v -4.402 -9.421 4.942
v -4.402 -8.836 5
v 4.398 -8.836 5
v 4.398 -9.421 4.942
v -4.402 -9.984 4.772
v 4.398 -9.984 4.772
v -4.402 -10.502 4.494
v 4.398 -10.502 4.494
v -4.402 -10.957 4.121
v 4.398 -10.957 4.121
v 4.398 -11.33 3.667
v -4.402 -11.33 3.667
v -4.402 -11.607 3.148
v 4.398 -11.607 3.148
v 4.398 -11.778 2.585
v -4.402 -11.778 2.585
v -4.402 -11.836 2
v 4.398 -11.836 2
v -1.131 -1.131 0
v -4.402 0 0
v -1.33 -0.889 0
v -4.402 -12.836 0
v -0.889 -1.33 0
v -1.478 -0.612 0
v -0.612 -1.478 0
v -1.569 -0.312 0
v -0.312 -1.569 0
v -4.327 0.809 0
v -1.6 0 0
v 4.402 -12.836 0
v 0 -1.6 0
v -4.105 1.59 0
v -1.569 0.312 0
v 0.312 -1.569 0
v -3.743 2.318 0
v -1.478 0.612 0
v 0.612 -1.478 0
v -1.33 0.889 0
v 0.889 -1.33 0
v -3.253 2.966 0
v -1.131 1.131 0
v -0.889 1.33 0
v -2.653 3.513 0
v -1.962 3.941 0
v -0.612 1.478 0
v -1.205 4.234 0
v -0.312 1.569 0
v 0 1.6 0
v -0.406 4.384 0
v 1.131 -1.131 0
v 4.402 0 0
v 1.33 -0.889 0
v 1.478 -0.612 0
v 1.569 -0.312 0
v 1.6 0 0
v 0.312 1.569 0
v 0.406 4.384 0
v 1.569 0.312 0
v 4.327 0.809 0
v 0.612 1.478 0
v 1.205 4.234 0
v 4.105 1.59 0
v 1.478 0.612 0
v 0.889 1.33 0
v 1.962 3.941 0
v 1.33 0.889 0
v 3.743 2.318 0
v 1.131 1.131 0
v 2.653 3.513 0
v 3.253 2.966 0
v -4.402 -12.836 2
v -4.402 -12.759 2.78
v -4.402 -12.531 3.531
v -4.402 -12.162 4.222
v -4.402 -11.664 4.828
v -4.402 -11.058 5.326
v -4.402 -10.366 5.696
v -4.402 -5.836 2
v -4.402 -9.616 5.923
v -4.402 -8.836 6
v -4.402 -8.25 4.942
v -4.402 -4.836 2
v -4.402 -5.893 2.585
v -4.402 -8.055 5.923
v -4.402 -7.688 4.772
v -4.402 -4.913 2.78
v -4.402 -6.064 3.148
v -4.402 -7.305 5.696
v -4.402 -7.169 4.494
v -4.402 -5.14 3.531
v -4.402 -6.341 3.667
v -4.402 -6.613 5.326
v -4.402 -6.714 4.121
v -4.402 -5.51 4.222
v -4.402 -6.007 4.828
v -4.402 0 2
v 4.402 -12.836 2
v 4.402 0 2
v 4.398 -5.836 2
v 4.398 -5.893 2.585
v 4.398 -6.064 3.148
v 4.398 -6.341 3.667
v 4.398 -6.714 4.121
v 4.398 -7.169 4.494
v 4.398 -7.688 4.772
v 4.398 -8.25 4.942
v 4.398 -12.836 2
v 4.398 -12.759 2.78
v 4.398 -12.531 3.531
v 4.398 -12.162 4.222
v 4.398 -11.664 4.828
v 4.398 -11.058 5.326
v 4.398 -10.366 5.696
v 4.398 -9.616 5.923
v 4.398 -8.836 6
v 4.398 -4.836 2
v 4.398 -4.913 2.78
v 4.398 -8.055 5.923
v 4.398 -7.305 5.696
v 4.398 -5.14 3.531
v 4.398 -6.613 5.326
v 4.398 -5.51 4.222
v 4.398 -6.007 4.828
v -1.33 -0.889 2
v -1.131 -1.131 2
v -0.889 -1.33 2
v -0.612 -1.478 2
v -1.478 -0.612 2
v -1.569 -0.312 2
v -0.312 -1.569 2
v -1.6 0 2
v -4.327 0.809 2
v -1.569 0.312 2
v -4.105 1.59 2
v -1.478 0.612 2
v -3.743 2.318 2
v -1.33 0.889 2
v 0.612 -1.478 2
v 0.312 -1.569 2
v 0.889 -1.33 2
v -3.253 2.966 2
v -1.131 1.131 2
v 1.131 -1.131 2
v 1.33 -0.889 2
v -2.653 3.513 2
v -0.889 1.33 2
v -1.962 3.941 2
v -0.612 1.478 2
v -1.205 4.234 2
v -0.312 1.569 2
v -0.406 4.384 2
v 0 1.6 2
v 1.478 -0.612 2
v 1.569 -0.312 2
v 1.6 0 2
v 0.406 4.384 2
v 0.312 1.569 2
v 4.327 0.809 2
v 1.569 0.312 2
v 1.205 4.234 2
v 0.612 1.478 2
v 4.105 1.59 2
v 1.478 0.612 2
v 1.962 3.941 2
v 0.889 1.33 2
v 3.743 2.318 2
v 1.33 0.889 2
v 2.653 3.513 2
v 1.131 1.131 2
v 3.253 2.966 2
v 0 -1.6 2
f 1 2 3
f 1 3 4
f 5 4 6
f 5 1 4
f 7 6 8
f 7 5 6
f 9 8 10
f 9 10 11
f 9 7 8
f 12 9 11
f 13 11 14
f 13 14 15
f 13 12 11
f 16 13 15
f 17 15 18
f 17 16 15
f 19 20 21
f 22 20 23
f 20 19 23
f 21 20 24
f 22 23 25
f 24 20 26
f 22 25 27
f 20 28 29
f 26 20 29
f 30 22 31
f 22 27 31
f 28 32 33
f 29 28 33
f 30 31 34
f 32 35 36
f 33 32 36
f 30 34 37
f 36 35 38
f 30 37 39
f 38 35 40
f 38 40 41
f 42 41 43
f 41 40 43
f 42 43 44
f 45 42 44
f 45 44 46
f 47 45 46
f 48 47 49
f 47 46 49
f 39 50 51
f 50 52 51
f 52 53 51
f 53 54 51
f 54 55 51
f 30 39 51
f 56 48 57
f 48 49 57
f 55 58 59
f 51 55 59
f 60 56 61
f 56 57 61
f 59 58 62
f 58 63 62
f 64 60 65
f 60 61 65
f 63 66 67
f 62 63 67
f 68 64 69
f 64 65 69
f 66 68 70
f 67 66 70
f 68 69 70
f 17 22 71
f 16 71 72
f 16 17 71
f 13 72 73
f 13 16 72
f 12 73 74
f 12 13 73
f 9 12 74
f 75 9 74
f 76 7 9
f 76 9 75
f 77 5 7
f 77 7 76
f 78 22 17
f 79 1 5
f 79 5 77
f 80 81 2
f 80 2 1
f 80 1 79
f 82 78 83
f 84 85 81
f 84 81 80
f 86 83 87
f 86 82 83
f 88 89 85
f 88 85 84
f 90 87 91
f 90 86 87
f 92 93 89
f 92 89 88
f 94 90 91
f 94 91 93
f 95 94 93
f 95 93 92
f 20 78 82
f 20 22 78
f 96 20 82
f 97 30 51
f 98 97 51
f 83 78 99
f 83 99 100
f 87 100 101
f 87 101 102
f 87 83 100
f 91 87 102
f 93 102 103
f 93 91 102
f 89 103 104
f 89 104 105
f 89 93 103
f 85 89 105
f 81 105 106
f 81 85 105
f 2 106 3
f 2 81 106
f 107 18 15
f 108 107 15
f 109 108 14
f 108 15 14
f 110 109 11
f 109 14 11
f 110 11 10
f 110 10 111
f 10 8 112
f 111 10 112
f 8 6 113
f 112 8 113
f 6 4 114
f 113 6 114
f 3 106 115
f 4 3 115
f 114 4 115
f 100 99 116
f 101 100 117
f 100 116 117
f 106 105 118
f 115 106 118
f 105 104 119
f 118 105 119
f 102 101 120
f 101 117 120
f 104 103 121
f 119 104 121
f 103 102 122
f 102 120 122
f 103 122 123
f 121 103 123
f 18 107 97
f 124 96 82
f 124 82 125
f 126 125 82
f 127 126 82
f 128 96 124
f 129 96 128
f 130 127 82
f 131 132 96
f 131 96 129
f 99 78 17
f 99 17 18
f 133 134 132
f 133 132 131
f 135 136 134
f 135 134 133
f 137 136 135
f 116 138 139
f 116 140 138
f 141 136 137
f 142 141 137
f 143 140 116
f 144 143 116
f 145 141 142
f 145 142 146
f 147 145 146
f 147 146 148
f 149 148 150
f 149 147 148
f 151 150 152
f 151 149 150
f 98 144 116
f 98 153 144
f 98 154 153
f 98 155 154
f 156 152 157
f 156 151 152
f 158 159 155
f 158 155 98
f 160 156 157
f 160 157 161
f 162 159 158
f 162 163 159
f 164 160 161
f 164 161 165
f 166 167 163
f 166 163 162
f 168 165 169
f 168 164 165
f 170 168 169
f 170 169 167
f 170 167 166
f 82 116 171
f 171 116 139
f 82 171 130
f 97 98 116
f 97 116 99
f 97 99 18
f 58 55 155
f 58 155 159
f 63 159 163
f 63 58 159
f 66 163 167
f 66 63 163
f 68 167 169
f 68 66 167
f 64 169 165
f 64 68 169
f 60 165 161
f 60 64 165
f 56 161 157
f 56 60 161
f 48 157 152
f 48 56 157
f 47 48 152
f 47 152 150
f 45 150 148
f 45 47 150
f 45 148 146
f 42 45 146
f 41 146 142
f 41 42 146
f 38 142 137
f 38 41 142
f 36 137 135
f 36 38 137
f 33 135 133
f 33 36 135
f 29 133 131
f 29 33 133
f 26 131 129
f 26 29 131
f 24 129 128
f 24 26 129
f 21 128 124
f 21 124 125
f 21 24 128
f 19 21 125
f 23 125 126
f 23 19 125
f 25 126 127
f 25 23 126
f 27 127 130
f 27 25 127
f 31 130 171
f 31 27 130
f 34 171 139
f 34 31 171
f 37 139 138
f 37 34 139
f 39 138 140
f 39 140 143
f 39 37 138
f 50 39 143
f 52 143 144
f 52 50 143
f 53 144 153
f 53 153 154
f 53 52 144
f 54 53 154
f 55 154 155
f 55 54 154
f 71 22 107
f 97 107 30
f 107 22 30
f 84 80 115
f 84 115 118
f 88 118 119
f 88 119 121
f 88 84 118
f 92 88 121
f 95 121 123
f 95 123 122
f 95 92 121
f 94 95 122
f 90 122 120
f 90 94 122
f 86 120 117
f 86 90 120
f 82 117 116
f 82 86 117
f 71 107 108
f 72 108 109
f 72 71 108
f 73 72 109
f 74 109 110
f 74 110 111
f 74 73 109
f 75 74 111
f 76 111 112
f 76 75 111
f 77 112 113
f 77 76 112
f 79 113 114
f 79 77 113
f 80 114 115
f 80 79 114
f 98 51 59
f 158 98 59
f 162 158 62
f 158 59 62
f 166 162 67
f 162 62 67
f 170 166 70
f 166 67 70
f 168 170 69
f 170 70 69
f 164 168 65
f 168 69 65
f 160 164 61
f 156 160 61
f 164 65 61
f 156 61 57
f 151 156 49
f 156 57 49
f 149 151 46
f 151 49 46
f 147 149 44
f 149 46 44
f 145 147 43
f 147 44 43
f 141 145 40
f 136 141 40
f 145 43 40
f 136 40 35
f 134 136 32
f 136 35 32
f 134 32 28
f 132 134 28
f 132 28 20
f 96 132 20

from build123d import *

# Parameters (mm, degrees)
SKETCH_1_R      = 4.402451684
SKETCH_1_R_2    = 1.6
EXTRUDE_1_DEPTH = 2
EXTRUDE_4_DEPTH = 8.8


with BuildPart() as part:
    # 草图1 → 凸台-拉伸1 (new body)
    # profile 1 of 2: a face of its own
    with BuildSketch(Plane.XY):
        Circle(SKETCH_1_R)
        Circle(SKETCH_1_R_2, mode=Mode.SUBTRACT)
    # profile 2 of 2: a face of its own
    with BuildSketch(Plane.XY):
        with BuildLine():
            ThreePointArc((4.402451684, 0), (0, -4.402451684), (-4.402451684, 0))
            Line((-4.402451684, 0), (-4.402451684, -12.835731795))
            Line((-4.402451684, -12.835731795), (4.402451684, -12.835731795))
            Line((4.402451684, -12.835731795), (4.402451684, 0))
        make_face()
    extrude(amount=EXTRUDE_1_DEPTH)

    # 草图4 → 凸台-拉伸4 (add)
    with BuildSketch(Plane.ZY.offset(4.402451684)):
        with BuildLine():
            ThreePointArc((6, -8.835731795), (4.828427125, -6.00730467), (2, -4.835731795))
            Line((2, -4.835731795), (2, -5.835731795))
            ThreePointArc((2, -5.835731795), (4.121320344, -6.714411452), (5, -8.835731795))
            ThreePointArc((5, -8.835731795), (4.121320344, -10.957052139), (2, -11.835731795))
            Line((2, -11.835731795), (2, -12.835731795))
            ThreePointArc((2, -12.835731795), (4.828427125, -11.66415892), (6, -8.835731795))
        make_face()
    extrude(amount=-EXTRUDE_4_DEPTH)


solid = part.part
